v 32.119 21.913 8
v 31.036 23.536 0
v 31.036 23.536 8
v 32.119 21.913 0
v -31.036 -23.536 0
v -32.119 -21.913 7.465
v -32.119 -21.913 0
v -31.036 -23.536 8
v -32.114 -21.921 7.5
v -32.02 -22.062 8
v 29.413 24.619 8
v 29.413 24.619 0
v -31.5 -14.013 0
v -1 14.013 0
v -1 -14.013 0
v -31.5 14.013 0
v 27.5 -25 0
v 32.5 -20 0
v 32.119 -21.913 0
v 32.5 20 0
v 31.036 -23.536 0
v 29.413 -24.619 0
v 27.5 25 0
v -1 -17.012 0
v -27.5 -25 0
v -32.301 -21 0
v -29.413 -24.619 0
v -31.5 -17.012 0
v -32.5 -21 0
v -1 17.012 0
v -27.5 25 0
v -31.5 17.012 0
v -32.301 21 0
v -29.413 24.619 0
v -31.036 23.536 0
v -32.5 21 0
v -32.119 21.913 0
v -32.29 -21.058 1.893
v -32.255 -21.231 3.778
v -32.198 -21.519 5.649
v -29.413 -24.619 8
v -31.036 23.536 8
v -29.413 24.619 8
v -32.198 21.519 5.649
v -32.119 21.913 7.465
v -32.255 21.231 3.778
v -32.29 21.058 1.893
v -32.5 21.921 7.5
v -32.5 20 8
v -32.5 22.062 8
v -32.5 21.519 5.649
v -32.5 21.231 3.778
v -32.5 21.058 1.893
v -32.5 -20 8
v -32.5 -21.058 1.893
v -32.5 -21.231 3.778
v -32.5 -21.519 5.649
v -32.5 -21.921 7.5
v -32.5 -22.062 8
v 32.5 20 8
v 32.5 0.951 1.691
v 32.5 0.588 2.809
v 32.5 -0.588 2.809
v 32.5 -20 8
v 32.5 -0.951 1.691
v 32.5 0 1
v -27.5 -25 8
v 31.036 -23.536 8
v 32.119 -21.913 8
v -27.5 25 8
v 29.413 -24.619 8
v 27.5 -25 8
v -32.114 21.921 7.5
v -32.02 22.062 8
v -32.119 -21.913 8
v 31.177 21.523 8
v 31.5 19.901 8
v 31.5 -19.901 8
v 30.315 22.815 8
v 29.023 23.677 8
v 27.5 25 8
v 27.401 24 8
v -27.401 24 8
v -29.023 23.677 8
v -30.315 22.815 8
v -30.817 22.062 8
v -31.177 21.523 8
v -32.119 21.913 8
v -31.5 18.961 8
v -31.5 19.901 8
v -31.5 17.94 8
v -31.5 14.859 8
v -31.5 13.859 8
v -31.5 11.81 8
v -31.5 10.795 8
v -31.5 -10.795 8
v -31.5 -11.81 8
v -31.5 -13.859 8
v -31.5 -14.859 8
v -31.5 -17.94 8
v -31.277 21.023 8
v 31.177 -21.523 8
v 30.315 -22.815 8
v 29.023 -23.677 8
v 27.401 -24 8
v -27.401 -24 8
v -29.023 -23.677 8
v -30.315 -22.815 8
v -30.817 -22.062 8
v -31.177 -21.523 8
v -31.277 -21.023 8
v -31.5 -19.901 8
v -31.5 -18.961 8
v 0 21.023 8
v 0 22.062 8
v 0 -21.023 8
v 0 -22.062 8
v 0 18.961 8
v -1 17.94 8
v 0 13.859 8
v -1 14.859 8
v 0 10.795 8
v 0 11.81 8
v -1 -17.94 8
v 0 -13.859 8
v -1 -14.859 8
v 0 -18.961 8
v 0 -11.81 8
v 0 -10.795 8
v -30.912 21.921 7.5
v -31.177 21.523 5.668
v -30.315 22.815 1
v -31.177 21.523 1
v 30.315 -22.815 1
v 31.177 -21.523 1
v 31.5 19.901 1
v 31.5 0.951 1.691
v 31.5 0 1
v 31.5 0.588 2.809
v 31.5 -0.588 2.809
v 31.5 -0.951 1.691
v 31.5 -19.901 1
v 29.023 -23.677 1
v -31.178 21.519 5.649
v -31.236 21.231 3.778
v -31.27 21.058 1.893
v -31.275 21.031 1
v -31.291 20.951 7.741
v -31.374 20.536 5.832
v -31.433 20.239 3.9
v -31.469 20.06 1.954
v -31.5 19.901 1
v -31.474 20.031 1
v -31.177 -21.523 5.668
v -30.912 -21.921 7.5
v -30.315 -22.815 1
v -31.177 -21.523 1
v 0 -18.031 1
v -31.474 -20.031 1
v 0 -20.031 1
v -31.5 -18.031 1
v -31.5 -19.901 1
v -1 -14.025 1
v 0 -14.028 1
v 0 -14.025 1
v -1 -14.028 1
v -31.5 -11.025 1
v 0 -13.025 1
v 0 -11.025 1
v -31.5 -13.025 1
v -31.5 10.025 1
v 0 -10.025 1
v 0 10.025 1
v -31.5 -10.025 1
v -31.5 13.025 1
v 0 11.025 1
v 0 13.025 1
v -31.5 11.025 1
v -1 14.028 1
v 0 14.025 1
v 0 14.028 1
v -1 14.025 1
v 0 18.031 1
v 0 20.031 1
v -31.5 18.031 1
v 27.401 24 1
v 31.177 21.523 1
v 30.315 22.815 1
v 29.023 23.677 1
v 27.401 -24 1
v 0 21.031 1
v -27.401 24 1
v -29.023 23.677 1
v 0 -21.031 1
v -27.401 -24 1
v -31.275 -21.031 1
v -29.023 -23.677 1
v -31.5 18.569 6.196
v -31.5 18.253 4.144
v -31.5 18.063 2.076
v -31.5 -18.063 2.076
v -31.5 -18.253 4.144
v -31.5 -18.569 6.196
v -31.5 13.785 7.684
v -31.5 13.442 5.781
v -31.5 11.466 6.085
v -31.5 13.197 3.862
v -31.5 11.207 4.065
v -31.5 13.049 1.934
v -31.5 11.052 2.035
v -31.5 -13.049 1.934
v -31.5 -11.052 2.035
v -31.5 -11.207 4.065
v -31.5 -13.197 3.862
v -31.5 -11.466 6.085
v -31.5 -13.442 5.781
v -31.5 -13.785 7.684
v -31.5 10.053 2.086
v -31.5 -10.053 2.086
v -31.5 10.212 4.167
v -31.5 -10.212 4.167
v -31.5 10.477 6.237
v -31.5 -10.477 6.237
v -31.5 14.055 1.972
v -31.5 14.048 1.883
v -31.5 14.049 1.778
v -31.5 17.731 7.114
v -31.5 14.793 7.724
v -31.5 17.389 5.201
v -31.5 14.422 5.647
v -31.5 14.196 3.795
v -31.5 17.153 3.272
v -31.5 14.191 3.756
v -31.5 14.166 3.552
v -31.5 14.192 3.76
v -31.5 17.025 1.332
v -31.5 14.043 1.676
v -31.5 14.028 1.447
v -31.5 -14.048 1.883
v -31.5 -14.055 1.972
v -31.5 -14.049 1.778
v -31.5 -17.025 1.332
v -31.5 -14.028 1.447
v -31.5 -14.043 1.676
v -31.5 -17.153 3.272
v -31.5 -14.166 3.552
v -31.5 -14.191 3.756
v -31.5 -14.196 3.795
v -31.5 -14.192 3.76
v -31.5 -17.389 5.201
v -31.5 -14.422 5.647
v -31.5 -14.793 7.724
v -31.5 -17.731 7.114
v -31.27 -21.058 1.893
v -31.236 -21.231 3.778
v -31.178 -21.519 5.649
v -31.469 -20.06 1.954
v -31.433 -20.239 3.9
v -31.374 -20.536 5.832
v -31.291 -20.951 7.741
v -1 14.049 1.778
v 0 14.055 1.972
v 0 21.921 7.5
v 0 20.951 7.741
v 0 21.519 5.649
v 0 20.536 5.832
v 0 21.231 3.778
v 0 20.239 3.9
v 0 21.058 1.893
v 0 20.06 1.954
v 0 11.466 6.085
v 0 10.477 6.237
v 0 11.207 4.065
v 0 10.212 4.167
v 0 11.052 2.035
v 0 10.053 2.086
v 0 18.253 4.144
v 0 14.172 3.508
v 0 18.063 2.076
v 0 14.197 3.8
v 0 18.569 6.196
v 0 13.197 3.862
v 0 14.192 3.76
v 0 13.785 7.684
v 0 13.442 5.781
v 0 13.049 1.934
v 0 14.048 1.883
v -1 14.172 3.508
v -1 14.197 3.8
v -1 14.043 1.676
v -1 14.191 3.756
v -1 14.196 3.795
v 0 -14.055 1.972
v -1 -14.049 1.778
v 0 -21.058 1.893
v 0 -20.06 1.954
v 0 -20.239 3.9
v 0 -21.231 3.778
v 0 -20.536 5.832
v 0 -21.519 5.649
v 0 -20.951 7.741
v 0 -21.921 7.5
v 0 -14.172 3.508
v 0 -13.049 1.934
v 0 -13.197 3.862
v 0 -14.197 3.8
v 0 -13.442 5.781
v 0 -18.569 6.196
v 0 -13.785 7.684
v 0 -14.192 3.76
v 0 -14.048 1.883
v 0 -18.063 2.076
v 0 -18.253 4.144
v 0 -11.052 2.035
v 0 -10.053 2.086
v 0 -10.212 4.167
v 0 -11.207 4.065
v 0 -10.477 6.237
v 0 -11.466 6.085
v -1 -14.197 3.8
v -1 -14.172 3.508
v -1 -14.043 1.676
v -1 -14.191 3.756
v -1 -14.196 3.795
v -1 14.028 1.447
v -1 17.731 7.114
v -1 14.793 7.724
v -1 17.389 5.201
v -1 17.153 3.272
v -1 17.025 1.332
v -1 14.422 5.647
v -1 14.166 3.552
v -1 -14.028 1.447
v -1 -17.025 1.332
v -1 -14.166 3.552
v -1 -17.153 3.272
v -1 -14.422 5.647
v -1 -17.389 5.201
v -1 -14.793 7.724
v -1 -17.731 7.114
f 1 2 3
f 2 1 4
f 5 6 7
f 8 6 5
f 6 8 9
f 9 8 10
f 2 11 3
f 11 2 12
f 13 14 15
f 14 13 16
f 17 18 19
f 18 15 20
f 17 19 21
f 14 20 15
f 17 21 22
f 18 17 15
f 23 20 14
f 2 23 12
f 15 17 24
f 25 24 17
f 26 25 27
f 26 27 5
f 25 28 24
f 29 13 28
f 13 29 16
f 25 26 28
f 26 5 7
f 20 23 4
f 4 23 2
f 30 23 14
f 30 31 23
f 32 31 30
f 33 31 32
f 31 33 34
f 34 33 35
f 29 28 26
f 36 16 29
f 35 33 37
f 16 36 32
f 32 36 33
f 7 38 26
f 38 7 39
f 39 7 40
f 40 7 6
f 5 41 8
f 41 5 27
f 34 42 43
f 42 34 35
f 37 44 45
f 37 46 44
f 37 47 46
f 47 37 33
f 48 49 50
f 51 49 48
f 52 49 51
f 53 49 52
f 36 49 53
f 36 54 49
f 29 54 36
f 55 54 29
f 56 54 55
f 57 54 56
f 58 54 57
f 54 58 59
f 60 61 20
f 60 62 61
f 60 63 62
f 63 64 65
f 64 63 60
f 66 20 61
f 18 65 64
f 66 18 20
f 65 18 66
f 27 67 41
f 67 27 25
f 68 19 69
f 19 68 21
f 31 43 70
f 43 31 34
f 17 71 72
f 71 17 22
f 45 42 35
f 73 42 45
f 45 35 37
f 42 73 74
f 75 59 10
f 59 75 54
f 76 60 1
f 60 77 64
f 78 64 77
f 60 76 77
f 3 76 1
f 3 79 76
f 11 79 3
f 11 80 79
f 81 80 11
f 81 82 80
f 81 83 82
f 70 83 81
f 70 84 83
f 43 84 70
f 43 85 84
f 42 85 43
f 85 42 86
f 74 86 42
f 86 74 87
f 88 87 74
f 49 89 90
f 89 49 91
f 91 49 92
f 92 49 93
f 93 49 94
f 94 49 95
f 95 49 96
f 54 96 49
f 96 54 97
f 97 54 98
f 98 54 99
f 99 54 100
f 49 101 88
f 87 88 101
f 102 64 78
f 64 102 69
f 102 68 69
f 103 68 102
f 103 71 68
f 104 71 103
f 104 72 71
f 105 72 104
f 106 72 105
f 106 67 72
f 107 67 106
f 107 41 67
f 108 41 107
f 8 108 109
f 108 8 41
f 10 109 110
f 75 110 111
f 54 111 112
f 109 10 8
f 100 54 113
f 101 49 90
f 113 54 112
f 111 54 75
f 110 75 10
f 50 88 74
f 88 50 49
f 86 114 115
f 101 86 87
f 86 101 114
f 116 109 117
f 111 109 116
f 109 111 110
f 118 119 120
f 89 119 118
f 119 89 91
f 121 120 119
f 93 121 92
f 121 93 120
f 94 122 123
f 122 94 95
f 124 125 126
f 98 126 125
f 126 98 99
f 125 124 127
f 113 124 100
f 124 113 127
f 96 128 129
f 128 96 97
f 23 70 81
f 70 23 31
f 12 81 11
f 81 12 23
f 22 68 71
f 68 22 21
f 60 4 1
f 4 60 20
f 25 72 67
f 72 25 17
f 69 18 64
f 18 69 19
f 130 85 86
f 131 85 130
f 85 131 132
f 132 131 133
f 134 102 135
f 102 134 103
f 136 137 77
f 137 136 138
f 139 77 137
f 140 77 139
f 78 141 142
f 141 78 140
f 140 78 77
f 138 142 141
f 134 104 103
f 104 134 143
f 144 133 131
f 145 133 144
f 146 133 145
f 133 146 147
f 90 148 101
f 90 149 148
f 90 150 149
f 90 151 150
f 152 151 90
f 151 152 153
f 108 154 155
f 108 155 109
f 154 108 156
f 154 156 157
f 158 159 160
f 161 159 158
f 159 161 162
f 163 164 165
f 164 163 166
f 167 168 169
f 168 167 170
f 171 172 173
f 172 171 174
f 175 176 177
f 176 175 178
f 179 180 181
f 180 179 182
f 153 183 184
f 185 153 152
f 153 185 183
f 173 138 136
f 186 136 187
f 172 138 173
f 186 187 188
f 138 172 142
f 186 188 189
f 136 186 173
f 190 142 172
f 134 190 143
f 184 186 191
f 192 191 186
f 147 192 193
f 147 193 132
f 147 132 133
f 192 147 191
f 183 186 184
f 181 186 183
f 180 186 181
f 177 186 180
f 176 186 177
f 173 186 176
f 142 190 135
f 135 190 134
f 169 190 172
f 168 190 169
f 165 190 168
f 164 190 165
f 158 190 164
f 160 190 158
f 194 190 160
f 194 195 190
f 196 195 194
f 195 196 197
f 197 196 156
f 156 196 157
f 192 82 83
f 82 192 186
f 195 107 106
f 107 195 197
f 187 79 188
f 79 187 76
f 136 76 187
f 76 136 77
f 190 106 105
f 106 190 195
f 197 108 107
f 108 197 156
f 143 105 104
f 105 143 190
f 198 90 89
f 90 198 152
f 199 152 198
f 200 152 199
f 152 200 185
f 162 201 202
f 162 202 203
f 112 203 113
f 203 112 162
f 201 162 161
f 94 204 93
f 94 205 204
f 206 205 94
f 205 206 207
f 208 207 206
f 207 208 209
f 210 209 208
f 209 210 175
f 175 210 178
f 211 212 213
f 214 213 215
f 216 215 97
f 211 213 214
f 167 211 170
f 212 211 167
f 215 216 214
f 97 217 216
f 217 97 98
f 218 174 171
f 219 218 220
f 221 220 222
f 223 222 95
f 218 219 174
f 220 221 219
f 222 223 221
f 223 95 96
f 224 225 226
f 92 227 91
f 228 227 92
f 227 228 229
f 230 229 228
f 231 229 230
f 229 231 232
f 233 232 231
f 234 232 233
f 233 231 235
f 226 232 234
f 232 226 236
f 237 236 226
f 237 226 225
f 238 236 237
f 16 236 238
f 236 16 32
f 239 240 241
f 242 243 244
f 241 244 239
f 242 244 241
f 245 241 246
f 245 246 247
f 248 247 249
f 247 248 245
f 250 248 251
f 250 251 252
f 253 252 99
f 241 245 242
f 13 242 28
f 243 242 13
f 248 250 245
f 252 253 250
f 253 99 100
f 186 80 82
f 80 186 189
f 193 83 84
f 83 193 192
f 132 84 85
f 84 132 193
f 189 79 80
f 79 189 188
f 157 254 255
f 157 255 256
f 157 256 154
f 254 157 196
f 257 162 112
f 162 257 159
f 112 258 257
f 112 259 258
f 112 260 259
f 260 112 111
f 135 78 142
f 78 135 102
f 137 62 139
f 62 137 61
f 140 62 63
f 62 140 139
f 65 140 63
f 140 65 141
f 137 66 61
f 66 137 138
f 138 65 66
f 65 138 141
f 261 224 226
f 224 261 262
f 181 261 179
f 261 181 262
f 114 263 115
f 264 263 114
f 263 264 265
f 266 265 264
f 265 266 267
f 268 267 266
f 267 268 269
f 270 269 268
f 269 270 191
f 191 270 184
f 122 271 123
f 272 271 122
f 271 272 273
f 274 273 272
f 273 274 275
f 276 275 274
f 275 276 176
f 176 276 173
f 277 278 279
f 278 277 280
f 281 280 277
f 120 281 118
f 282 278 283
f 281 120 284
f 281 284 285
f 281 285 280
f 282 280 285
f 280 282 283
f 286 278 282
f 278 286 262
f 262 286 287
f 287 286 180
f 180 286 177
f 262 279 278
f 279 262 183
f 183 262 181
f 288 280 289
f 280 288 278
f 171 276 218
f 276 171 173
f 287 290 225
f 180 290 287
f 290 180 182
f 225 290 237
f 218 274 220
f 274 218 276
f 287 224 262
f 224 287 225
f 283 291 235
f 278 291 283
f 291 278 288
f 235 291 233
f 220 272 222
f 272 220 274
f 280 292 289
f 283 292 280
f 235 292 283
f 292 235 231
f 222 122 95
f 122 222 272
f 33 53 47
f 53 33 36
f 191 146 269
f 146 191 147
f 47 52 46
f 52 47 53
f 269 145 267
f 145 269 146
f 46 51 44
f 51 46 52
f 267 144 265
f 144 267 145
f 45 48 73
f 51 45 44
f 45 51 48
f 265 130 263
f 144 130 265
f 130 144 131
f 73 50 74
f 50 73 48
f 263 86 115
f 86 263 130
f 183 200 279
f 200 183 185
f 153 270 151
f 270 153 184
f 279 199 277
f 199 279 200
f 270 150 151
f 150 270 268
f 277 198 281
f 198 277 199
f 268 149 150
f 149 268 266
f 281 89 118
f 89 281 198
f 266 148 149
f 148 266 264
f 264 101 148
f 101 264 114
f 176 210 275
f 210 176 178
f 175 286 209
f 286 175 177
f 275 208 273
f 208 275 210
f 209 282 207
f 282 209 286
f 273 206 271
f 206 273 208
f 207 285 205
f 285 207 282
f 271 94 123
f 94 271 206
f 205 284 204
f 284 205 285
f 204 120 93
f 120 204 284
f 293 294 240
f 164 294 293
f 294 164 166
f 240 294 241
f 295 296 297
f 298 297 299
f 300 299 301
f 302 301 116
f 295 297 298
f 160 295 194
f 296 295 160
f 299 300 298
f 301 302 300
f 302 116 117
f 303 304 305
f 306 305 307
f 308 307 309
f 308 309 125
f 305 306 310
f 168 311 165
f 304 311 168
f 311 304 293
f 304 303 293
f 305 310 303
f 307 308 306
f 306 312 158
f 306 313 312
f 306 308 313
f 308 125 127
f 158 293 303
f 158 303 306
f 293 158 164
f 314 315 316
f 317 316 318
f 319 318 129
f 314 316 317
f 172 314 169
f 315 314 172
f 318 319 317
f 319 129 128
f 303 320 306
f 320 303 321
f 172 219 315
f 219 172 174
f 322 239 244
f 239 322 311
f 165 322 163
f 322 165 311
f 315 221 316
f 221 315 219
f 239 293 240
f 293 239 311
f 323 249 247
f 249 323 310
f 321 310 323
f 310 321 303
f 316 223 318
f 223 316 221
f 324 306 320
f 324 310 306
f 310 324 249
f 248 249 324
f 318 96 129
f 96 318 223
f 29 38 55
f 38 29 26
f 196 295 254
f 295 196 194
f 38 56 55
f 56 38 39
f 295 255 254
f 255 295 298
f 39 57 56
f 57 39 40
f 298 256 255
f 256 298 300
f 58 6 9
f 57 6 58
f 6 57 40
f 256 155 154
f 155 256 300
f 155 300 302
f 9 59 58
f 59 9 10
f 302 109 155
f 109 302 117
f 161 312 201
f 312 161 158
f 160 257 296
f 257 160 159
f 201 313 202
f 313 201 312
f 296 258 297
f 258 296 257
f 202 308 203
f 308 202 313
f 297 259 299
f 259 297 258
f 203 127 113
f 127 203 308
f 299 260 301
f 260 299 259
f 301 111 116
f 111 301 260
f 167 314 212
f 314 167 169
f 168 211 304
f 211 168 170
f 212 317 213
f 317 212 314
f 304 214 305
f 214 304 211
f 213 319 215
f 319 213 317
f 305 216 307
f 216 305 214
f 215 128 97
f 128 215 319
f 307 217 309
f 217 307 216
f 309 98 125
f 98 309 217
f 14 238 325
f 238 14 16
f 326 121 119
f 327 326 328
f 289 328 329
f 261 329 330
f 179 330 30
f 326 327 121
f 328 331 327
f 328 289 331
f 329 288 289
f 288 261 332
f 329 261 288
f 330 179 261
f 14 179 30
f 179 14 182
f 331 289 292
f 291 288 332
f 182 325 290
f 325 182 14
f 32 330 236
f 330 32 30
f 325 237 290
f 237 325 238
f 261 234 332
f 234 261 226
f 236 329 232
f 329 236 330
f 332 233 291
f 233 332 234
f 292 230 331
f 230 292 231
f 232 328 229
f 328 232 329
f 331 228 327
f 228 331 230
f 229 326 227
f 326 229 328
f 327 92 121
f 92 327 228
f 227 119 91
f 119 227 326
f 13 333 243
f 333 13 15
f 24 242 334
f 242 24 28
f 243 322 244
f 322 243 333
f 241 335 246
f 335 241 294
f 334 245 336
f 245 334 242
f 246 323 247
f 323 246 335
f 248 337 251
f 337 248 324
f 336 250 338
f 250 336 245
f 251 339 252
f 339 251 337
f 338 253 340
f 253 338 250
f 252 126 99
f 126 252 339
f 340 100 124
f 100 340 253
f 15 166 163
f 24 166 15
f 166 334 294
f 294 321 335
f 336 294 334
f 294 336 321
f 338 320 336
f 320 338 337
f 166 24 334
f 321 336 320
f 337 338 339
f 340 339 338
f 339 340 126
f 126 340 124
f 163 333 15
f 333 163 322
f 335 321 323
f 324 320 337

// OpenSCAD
Outer_Width = 65;
width = Outer_Width;

Outer_Length = 50;
length = Outer_Length;

Outer_Height = 8;
height = Outer_Height;

Corner_Radius = 5;
radius = Corner_Radius;

Wall_Thickness = 1;
wall = Wall_Thickness;

Larger_Diameter = 76;
large = Larger_Diameter / 2; // convert to radius

Smaller_Diameter = 64;
small = Smaller_Diameter / 2; // convert to radius

Pipe_Thickness = 2;
Wing_Distance = 5;
Wing_Separation = 5;
Wing_Angle = 0;
Wing_Offset = length/2-Wing_Distance;

Wire_Size = 2;

Curve_Resolution = 2; // [1:High, 2:Medium, 4:Low]
$fs = Curve_Resolution;
$fa = 0.01 + 0;

part = "Combined"; // [Tray, Slots, Combined]

if (part == "Tray") {
	tray();
}
else if (part == "Slots") {
	difference() {
		slots("positive");
		slots("negative");
	}
}
else if (part == "Combined") {
	difference() {
		union() {
			tray();
			slots("positive");
		}

		slots("negative");
	}
}

module arch(thickness, length, radius, additional_rotation=0) {
	rotate(Wing_Angle, [1,0,0])                          // Rotate to wing angle
		translate([0, radius, 0])                        // Move to origin
			rotate(-90, [0,0,1])                         // Align with tray
				rotate(90, [1,0,0])                      // Turn upright
					rotate(additional_rotation, [0,0,1]) // Additional rotation
						rotate_extrude(angle=35)         // Create body
							translate([radius, 0, 0])    // Arch radius
								square([thickness, length]); // Arch shape
}

module slot_positive() {
	translate([0, Wing_Offset+wall, 0]) {
		arch(Pipe_Thickness+wall*2, width/2, small-wall); // Small Wing

		translate([0, -Pipe_Thickness, 0]) {
			arch(Wing_Separation, width/2, small+Pipe_Thickness); // Water Hole

			translate([0, -Wing_Separation, 0])
				arch(Pipe_Thickness+wall*2, width/2, large-wall); // Large Wing
		}
	}
}
module slot_negative() {
	translate([wall, Wing_Offset, 0]) {
		#arch(Pipe_Thickness, width/2, small); // Small Wing

		translate([0, -wall-Pipe_Thickness, 0]) {
			translate([0, wall-Wing_Separation, 0])
				#arch(Pipe_Thickness, width/2, large); // Large Wing
		}
	}
}

module slot(where="positive") {
	if (where == "positive") {
		difference() {
			slot_positive();
			slot_negative();
		}
	}
	else { // if (where == "negative") {
		translate([-wall, Wing_Offset-wall-Pipe_Thickness, 0])
			arch(Wing_Separation-wall*2,
				width/2-wall*2,
				small+Pipe_Thickness+wall,
				-1
			);
	}
}

module slots(where="positive") {
	difference() {
		union() {
			slot(where);
			mirror([0,1,0])
				slot(where);
		}

		translate([0, 0, height*1.5+height])
			cube([width*2, length*2, height*3], true);
		translate([0, 0, -height])
			cube([width*2, length*2, height], true);
	}
}

module tray() {
	difference() {
		linear_extrude(height)
			perimeter();

		translate([0, 0, wall])
			linear_extrude(height)
				offset(-wall)
					perimeter();

		translate([width/2-wall-1, 0, Wire_Size/2+wall])
			rotate(90, [0,1,0])
				cylinder(d=Wire_Size, h=wall+2);
	}
}

module perimeter() {
	x = width/2-radius;
	y = length/2-radius;
	hull() {
		translate([-x, +y, 0]) circle(radius);
		translate([+x, +y, 0]) circle(radius);
		translate([-x, -y, 0]) circle(radius);
		translate([+x, -y, 0]) circle(radius);
	};
}
